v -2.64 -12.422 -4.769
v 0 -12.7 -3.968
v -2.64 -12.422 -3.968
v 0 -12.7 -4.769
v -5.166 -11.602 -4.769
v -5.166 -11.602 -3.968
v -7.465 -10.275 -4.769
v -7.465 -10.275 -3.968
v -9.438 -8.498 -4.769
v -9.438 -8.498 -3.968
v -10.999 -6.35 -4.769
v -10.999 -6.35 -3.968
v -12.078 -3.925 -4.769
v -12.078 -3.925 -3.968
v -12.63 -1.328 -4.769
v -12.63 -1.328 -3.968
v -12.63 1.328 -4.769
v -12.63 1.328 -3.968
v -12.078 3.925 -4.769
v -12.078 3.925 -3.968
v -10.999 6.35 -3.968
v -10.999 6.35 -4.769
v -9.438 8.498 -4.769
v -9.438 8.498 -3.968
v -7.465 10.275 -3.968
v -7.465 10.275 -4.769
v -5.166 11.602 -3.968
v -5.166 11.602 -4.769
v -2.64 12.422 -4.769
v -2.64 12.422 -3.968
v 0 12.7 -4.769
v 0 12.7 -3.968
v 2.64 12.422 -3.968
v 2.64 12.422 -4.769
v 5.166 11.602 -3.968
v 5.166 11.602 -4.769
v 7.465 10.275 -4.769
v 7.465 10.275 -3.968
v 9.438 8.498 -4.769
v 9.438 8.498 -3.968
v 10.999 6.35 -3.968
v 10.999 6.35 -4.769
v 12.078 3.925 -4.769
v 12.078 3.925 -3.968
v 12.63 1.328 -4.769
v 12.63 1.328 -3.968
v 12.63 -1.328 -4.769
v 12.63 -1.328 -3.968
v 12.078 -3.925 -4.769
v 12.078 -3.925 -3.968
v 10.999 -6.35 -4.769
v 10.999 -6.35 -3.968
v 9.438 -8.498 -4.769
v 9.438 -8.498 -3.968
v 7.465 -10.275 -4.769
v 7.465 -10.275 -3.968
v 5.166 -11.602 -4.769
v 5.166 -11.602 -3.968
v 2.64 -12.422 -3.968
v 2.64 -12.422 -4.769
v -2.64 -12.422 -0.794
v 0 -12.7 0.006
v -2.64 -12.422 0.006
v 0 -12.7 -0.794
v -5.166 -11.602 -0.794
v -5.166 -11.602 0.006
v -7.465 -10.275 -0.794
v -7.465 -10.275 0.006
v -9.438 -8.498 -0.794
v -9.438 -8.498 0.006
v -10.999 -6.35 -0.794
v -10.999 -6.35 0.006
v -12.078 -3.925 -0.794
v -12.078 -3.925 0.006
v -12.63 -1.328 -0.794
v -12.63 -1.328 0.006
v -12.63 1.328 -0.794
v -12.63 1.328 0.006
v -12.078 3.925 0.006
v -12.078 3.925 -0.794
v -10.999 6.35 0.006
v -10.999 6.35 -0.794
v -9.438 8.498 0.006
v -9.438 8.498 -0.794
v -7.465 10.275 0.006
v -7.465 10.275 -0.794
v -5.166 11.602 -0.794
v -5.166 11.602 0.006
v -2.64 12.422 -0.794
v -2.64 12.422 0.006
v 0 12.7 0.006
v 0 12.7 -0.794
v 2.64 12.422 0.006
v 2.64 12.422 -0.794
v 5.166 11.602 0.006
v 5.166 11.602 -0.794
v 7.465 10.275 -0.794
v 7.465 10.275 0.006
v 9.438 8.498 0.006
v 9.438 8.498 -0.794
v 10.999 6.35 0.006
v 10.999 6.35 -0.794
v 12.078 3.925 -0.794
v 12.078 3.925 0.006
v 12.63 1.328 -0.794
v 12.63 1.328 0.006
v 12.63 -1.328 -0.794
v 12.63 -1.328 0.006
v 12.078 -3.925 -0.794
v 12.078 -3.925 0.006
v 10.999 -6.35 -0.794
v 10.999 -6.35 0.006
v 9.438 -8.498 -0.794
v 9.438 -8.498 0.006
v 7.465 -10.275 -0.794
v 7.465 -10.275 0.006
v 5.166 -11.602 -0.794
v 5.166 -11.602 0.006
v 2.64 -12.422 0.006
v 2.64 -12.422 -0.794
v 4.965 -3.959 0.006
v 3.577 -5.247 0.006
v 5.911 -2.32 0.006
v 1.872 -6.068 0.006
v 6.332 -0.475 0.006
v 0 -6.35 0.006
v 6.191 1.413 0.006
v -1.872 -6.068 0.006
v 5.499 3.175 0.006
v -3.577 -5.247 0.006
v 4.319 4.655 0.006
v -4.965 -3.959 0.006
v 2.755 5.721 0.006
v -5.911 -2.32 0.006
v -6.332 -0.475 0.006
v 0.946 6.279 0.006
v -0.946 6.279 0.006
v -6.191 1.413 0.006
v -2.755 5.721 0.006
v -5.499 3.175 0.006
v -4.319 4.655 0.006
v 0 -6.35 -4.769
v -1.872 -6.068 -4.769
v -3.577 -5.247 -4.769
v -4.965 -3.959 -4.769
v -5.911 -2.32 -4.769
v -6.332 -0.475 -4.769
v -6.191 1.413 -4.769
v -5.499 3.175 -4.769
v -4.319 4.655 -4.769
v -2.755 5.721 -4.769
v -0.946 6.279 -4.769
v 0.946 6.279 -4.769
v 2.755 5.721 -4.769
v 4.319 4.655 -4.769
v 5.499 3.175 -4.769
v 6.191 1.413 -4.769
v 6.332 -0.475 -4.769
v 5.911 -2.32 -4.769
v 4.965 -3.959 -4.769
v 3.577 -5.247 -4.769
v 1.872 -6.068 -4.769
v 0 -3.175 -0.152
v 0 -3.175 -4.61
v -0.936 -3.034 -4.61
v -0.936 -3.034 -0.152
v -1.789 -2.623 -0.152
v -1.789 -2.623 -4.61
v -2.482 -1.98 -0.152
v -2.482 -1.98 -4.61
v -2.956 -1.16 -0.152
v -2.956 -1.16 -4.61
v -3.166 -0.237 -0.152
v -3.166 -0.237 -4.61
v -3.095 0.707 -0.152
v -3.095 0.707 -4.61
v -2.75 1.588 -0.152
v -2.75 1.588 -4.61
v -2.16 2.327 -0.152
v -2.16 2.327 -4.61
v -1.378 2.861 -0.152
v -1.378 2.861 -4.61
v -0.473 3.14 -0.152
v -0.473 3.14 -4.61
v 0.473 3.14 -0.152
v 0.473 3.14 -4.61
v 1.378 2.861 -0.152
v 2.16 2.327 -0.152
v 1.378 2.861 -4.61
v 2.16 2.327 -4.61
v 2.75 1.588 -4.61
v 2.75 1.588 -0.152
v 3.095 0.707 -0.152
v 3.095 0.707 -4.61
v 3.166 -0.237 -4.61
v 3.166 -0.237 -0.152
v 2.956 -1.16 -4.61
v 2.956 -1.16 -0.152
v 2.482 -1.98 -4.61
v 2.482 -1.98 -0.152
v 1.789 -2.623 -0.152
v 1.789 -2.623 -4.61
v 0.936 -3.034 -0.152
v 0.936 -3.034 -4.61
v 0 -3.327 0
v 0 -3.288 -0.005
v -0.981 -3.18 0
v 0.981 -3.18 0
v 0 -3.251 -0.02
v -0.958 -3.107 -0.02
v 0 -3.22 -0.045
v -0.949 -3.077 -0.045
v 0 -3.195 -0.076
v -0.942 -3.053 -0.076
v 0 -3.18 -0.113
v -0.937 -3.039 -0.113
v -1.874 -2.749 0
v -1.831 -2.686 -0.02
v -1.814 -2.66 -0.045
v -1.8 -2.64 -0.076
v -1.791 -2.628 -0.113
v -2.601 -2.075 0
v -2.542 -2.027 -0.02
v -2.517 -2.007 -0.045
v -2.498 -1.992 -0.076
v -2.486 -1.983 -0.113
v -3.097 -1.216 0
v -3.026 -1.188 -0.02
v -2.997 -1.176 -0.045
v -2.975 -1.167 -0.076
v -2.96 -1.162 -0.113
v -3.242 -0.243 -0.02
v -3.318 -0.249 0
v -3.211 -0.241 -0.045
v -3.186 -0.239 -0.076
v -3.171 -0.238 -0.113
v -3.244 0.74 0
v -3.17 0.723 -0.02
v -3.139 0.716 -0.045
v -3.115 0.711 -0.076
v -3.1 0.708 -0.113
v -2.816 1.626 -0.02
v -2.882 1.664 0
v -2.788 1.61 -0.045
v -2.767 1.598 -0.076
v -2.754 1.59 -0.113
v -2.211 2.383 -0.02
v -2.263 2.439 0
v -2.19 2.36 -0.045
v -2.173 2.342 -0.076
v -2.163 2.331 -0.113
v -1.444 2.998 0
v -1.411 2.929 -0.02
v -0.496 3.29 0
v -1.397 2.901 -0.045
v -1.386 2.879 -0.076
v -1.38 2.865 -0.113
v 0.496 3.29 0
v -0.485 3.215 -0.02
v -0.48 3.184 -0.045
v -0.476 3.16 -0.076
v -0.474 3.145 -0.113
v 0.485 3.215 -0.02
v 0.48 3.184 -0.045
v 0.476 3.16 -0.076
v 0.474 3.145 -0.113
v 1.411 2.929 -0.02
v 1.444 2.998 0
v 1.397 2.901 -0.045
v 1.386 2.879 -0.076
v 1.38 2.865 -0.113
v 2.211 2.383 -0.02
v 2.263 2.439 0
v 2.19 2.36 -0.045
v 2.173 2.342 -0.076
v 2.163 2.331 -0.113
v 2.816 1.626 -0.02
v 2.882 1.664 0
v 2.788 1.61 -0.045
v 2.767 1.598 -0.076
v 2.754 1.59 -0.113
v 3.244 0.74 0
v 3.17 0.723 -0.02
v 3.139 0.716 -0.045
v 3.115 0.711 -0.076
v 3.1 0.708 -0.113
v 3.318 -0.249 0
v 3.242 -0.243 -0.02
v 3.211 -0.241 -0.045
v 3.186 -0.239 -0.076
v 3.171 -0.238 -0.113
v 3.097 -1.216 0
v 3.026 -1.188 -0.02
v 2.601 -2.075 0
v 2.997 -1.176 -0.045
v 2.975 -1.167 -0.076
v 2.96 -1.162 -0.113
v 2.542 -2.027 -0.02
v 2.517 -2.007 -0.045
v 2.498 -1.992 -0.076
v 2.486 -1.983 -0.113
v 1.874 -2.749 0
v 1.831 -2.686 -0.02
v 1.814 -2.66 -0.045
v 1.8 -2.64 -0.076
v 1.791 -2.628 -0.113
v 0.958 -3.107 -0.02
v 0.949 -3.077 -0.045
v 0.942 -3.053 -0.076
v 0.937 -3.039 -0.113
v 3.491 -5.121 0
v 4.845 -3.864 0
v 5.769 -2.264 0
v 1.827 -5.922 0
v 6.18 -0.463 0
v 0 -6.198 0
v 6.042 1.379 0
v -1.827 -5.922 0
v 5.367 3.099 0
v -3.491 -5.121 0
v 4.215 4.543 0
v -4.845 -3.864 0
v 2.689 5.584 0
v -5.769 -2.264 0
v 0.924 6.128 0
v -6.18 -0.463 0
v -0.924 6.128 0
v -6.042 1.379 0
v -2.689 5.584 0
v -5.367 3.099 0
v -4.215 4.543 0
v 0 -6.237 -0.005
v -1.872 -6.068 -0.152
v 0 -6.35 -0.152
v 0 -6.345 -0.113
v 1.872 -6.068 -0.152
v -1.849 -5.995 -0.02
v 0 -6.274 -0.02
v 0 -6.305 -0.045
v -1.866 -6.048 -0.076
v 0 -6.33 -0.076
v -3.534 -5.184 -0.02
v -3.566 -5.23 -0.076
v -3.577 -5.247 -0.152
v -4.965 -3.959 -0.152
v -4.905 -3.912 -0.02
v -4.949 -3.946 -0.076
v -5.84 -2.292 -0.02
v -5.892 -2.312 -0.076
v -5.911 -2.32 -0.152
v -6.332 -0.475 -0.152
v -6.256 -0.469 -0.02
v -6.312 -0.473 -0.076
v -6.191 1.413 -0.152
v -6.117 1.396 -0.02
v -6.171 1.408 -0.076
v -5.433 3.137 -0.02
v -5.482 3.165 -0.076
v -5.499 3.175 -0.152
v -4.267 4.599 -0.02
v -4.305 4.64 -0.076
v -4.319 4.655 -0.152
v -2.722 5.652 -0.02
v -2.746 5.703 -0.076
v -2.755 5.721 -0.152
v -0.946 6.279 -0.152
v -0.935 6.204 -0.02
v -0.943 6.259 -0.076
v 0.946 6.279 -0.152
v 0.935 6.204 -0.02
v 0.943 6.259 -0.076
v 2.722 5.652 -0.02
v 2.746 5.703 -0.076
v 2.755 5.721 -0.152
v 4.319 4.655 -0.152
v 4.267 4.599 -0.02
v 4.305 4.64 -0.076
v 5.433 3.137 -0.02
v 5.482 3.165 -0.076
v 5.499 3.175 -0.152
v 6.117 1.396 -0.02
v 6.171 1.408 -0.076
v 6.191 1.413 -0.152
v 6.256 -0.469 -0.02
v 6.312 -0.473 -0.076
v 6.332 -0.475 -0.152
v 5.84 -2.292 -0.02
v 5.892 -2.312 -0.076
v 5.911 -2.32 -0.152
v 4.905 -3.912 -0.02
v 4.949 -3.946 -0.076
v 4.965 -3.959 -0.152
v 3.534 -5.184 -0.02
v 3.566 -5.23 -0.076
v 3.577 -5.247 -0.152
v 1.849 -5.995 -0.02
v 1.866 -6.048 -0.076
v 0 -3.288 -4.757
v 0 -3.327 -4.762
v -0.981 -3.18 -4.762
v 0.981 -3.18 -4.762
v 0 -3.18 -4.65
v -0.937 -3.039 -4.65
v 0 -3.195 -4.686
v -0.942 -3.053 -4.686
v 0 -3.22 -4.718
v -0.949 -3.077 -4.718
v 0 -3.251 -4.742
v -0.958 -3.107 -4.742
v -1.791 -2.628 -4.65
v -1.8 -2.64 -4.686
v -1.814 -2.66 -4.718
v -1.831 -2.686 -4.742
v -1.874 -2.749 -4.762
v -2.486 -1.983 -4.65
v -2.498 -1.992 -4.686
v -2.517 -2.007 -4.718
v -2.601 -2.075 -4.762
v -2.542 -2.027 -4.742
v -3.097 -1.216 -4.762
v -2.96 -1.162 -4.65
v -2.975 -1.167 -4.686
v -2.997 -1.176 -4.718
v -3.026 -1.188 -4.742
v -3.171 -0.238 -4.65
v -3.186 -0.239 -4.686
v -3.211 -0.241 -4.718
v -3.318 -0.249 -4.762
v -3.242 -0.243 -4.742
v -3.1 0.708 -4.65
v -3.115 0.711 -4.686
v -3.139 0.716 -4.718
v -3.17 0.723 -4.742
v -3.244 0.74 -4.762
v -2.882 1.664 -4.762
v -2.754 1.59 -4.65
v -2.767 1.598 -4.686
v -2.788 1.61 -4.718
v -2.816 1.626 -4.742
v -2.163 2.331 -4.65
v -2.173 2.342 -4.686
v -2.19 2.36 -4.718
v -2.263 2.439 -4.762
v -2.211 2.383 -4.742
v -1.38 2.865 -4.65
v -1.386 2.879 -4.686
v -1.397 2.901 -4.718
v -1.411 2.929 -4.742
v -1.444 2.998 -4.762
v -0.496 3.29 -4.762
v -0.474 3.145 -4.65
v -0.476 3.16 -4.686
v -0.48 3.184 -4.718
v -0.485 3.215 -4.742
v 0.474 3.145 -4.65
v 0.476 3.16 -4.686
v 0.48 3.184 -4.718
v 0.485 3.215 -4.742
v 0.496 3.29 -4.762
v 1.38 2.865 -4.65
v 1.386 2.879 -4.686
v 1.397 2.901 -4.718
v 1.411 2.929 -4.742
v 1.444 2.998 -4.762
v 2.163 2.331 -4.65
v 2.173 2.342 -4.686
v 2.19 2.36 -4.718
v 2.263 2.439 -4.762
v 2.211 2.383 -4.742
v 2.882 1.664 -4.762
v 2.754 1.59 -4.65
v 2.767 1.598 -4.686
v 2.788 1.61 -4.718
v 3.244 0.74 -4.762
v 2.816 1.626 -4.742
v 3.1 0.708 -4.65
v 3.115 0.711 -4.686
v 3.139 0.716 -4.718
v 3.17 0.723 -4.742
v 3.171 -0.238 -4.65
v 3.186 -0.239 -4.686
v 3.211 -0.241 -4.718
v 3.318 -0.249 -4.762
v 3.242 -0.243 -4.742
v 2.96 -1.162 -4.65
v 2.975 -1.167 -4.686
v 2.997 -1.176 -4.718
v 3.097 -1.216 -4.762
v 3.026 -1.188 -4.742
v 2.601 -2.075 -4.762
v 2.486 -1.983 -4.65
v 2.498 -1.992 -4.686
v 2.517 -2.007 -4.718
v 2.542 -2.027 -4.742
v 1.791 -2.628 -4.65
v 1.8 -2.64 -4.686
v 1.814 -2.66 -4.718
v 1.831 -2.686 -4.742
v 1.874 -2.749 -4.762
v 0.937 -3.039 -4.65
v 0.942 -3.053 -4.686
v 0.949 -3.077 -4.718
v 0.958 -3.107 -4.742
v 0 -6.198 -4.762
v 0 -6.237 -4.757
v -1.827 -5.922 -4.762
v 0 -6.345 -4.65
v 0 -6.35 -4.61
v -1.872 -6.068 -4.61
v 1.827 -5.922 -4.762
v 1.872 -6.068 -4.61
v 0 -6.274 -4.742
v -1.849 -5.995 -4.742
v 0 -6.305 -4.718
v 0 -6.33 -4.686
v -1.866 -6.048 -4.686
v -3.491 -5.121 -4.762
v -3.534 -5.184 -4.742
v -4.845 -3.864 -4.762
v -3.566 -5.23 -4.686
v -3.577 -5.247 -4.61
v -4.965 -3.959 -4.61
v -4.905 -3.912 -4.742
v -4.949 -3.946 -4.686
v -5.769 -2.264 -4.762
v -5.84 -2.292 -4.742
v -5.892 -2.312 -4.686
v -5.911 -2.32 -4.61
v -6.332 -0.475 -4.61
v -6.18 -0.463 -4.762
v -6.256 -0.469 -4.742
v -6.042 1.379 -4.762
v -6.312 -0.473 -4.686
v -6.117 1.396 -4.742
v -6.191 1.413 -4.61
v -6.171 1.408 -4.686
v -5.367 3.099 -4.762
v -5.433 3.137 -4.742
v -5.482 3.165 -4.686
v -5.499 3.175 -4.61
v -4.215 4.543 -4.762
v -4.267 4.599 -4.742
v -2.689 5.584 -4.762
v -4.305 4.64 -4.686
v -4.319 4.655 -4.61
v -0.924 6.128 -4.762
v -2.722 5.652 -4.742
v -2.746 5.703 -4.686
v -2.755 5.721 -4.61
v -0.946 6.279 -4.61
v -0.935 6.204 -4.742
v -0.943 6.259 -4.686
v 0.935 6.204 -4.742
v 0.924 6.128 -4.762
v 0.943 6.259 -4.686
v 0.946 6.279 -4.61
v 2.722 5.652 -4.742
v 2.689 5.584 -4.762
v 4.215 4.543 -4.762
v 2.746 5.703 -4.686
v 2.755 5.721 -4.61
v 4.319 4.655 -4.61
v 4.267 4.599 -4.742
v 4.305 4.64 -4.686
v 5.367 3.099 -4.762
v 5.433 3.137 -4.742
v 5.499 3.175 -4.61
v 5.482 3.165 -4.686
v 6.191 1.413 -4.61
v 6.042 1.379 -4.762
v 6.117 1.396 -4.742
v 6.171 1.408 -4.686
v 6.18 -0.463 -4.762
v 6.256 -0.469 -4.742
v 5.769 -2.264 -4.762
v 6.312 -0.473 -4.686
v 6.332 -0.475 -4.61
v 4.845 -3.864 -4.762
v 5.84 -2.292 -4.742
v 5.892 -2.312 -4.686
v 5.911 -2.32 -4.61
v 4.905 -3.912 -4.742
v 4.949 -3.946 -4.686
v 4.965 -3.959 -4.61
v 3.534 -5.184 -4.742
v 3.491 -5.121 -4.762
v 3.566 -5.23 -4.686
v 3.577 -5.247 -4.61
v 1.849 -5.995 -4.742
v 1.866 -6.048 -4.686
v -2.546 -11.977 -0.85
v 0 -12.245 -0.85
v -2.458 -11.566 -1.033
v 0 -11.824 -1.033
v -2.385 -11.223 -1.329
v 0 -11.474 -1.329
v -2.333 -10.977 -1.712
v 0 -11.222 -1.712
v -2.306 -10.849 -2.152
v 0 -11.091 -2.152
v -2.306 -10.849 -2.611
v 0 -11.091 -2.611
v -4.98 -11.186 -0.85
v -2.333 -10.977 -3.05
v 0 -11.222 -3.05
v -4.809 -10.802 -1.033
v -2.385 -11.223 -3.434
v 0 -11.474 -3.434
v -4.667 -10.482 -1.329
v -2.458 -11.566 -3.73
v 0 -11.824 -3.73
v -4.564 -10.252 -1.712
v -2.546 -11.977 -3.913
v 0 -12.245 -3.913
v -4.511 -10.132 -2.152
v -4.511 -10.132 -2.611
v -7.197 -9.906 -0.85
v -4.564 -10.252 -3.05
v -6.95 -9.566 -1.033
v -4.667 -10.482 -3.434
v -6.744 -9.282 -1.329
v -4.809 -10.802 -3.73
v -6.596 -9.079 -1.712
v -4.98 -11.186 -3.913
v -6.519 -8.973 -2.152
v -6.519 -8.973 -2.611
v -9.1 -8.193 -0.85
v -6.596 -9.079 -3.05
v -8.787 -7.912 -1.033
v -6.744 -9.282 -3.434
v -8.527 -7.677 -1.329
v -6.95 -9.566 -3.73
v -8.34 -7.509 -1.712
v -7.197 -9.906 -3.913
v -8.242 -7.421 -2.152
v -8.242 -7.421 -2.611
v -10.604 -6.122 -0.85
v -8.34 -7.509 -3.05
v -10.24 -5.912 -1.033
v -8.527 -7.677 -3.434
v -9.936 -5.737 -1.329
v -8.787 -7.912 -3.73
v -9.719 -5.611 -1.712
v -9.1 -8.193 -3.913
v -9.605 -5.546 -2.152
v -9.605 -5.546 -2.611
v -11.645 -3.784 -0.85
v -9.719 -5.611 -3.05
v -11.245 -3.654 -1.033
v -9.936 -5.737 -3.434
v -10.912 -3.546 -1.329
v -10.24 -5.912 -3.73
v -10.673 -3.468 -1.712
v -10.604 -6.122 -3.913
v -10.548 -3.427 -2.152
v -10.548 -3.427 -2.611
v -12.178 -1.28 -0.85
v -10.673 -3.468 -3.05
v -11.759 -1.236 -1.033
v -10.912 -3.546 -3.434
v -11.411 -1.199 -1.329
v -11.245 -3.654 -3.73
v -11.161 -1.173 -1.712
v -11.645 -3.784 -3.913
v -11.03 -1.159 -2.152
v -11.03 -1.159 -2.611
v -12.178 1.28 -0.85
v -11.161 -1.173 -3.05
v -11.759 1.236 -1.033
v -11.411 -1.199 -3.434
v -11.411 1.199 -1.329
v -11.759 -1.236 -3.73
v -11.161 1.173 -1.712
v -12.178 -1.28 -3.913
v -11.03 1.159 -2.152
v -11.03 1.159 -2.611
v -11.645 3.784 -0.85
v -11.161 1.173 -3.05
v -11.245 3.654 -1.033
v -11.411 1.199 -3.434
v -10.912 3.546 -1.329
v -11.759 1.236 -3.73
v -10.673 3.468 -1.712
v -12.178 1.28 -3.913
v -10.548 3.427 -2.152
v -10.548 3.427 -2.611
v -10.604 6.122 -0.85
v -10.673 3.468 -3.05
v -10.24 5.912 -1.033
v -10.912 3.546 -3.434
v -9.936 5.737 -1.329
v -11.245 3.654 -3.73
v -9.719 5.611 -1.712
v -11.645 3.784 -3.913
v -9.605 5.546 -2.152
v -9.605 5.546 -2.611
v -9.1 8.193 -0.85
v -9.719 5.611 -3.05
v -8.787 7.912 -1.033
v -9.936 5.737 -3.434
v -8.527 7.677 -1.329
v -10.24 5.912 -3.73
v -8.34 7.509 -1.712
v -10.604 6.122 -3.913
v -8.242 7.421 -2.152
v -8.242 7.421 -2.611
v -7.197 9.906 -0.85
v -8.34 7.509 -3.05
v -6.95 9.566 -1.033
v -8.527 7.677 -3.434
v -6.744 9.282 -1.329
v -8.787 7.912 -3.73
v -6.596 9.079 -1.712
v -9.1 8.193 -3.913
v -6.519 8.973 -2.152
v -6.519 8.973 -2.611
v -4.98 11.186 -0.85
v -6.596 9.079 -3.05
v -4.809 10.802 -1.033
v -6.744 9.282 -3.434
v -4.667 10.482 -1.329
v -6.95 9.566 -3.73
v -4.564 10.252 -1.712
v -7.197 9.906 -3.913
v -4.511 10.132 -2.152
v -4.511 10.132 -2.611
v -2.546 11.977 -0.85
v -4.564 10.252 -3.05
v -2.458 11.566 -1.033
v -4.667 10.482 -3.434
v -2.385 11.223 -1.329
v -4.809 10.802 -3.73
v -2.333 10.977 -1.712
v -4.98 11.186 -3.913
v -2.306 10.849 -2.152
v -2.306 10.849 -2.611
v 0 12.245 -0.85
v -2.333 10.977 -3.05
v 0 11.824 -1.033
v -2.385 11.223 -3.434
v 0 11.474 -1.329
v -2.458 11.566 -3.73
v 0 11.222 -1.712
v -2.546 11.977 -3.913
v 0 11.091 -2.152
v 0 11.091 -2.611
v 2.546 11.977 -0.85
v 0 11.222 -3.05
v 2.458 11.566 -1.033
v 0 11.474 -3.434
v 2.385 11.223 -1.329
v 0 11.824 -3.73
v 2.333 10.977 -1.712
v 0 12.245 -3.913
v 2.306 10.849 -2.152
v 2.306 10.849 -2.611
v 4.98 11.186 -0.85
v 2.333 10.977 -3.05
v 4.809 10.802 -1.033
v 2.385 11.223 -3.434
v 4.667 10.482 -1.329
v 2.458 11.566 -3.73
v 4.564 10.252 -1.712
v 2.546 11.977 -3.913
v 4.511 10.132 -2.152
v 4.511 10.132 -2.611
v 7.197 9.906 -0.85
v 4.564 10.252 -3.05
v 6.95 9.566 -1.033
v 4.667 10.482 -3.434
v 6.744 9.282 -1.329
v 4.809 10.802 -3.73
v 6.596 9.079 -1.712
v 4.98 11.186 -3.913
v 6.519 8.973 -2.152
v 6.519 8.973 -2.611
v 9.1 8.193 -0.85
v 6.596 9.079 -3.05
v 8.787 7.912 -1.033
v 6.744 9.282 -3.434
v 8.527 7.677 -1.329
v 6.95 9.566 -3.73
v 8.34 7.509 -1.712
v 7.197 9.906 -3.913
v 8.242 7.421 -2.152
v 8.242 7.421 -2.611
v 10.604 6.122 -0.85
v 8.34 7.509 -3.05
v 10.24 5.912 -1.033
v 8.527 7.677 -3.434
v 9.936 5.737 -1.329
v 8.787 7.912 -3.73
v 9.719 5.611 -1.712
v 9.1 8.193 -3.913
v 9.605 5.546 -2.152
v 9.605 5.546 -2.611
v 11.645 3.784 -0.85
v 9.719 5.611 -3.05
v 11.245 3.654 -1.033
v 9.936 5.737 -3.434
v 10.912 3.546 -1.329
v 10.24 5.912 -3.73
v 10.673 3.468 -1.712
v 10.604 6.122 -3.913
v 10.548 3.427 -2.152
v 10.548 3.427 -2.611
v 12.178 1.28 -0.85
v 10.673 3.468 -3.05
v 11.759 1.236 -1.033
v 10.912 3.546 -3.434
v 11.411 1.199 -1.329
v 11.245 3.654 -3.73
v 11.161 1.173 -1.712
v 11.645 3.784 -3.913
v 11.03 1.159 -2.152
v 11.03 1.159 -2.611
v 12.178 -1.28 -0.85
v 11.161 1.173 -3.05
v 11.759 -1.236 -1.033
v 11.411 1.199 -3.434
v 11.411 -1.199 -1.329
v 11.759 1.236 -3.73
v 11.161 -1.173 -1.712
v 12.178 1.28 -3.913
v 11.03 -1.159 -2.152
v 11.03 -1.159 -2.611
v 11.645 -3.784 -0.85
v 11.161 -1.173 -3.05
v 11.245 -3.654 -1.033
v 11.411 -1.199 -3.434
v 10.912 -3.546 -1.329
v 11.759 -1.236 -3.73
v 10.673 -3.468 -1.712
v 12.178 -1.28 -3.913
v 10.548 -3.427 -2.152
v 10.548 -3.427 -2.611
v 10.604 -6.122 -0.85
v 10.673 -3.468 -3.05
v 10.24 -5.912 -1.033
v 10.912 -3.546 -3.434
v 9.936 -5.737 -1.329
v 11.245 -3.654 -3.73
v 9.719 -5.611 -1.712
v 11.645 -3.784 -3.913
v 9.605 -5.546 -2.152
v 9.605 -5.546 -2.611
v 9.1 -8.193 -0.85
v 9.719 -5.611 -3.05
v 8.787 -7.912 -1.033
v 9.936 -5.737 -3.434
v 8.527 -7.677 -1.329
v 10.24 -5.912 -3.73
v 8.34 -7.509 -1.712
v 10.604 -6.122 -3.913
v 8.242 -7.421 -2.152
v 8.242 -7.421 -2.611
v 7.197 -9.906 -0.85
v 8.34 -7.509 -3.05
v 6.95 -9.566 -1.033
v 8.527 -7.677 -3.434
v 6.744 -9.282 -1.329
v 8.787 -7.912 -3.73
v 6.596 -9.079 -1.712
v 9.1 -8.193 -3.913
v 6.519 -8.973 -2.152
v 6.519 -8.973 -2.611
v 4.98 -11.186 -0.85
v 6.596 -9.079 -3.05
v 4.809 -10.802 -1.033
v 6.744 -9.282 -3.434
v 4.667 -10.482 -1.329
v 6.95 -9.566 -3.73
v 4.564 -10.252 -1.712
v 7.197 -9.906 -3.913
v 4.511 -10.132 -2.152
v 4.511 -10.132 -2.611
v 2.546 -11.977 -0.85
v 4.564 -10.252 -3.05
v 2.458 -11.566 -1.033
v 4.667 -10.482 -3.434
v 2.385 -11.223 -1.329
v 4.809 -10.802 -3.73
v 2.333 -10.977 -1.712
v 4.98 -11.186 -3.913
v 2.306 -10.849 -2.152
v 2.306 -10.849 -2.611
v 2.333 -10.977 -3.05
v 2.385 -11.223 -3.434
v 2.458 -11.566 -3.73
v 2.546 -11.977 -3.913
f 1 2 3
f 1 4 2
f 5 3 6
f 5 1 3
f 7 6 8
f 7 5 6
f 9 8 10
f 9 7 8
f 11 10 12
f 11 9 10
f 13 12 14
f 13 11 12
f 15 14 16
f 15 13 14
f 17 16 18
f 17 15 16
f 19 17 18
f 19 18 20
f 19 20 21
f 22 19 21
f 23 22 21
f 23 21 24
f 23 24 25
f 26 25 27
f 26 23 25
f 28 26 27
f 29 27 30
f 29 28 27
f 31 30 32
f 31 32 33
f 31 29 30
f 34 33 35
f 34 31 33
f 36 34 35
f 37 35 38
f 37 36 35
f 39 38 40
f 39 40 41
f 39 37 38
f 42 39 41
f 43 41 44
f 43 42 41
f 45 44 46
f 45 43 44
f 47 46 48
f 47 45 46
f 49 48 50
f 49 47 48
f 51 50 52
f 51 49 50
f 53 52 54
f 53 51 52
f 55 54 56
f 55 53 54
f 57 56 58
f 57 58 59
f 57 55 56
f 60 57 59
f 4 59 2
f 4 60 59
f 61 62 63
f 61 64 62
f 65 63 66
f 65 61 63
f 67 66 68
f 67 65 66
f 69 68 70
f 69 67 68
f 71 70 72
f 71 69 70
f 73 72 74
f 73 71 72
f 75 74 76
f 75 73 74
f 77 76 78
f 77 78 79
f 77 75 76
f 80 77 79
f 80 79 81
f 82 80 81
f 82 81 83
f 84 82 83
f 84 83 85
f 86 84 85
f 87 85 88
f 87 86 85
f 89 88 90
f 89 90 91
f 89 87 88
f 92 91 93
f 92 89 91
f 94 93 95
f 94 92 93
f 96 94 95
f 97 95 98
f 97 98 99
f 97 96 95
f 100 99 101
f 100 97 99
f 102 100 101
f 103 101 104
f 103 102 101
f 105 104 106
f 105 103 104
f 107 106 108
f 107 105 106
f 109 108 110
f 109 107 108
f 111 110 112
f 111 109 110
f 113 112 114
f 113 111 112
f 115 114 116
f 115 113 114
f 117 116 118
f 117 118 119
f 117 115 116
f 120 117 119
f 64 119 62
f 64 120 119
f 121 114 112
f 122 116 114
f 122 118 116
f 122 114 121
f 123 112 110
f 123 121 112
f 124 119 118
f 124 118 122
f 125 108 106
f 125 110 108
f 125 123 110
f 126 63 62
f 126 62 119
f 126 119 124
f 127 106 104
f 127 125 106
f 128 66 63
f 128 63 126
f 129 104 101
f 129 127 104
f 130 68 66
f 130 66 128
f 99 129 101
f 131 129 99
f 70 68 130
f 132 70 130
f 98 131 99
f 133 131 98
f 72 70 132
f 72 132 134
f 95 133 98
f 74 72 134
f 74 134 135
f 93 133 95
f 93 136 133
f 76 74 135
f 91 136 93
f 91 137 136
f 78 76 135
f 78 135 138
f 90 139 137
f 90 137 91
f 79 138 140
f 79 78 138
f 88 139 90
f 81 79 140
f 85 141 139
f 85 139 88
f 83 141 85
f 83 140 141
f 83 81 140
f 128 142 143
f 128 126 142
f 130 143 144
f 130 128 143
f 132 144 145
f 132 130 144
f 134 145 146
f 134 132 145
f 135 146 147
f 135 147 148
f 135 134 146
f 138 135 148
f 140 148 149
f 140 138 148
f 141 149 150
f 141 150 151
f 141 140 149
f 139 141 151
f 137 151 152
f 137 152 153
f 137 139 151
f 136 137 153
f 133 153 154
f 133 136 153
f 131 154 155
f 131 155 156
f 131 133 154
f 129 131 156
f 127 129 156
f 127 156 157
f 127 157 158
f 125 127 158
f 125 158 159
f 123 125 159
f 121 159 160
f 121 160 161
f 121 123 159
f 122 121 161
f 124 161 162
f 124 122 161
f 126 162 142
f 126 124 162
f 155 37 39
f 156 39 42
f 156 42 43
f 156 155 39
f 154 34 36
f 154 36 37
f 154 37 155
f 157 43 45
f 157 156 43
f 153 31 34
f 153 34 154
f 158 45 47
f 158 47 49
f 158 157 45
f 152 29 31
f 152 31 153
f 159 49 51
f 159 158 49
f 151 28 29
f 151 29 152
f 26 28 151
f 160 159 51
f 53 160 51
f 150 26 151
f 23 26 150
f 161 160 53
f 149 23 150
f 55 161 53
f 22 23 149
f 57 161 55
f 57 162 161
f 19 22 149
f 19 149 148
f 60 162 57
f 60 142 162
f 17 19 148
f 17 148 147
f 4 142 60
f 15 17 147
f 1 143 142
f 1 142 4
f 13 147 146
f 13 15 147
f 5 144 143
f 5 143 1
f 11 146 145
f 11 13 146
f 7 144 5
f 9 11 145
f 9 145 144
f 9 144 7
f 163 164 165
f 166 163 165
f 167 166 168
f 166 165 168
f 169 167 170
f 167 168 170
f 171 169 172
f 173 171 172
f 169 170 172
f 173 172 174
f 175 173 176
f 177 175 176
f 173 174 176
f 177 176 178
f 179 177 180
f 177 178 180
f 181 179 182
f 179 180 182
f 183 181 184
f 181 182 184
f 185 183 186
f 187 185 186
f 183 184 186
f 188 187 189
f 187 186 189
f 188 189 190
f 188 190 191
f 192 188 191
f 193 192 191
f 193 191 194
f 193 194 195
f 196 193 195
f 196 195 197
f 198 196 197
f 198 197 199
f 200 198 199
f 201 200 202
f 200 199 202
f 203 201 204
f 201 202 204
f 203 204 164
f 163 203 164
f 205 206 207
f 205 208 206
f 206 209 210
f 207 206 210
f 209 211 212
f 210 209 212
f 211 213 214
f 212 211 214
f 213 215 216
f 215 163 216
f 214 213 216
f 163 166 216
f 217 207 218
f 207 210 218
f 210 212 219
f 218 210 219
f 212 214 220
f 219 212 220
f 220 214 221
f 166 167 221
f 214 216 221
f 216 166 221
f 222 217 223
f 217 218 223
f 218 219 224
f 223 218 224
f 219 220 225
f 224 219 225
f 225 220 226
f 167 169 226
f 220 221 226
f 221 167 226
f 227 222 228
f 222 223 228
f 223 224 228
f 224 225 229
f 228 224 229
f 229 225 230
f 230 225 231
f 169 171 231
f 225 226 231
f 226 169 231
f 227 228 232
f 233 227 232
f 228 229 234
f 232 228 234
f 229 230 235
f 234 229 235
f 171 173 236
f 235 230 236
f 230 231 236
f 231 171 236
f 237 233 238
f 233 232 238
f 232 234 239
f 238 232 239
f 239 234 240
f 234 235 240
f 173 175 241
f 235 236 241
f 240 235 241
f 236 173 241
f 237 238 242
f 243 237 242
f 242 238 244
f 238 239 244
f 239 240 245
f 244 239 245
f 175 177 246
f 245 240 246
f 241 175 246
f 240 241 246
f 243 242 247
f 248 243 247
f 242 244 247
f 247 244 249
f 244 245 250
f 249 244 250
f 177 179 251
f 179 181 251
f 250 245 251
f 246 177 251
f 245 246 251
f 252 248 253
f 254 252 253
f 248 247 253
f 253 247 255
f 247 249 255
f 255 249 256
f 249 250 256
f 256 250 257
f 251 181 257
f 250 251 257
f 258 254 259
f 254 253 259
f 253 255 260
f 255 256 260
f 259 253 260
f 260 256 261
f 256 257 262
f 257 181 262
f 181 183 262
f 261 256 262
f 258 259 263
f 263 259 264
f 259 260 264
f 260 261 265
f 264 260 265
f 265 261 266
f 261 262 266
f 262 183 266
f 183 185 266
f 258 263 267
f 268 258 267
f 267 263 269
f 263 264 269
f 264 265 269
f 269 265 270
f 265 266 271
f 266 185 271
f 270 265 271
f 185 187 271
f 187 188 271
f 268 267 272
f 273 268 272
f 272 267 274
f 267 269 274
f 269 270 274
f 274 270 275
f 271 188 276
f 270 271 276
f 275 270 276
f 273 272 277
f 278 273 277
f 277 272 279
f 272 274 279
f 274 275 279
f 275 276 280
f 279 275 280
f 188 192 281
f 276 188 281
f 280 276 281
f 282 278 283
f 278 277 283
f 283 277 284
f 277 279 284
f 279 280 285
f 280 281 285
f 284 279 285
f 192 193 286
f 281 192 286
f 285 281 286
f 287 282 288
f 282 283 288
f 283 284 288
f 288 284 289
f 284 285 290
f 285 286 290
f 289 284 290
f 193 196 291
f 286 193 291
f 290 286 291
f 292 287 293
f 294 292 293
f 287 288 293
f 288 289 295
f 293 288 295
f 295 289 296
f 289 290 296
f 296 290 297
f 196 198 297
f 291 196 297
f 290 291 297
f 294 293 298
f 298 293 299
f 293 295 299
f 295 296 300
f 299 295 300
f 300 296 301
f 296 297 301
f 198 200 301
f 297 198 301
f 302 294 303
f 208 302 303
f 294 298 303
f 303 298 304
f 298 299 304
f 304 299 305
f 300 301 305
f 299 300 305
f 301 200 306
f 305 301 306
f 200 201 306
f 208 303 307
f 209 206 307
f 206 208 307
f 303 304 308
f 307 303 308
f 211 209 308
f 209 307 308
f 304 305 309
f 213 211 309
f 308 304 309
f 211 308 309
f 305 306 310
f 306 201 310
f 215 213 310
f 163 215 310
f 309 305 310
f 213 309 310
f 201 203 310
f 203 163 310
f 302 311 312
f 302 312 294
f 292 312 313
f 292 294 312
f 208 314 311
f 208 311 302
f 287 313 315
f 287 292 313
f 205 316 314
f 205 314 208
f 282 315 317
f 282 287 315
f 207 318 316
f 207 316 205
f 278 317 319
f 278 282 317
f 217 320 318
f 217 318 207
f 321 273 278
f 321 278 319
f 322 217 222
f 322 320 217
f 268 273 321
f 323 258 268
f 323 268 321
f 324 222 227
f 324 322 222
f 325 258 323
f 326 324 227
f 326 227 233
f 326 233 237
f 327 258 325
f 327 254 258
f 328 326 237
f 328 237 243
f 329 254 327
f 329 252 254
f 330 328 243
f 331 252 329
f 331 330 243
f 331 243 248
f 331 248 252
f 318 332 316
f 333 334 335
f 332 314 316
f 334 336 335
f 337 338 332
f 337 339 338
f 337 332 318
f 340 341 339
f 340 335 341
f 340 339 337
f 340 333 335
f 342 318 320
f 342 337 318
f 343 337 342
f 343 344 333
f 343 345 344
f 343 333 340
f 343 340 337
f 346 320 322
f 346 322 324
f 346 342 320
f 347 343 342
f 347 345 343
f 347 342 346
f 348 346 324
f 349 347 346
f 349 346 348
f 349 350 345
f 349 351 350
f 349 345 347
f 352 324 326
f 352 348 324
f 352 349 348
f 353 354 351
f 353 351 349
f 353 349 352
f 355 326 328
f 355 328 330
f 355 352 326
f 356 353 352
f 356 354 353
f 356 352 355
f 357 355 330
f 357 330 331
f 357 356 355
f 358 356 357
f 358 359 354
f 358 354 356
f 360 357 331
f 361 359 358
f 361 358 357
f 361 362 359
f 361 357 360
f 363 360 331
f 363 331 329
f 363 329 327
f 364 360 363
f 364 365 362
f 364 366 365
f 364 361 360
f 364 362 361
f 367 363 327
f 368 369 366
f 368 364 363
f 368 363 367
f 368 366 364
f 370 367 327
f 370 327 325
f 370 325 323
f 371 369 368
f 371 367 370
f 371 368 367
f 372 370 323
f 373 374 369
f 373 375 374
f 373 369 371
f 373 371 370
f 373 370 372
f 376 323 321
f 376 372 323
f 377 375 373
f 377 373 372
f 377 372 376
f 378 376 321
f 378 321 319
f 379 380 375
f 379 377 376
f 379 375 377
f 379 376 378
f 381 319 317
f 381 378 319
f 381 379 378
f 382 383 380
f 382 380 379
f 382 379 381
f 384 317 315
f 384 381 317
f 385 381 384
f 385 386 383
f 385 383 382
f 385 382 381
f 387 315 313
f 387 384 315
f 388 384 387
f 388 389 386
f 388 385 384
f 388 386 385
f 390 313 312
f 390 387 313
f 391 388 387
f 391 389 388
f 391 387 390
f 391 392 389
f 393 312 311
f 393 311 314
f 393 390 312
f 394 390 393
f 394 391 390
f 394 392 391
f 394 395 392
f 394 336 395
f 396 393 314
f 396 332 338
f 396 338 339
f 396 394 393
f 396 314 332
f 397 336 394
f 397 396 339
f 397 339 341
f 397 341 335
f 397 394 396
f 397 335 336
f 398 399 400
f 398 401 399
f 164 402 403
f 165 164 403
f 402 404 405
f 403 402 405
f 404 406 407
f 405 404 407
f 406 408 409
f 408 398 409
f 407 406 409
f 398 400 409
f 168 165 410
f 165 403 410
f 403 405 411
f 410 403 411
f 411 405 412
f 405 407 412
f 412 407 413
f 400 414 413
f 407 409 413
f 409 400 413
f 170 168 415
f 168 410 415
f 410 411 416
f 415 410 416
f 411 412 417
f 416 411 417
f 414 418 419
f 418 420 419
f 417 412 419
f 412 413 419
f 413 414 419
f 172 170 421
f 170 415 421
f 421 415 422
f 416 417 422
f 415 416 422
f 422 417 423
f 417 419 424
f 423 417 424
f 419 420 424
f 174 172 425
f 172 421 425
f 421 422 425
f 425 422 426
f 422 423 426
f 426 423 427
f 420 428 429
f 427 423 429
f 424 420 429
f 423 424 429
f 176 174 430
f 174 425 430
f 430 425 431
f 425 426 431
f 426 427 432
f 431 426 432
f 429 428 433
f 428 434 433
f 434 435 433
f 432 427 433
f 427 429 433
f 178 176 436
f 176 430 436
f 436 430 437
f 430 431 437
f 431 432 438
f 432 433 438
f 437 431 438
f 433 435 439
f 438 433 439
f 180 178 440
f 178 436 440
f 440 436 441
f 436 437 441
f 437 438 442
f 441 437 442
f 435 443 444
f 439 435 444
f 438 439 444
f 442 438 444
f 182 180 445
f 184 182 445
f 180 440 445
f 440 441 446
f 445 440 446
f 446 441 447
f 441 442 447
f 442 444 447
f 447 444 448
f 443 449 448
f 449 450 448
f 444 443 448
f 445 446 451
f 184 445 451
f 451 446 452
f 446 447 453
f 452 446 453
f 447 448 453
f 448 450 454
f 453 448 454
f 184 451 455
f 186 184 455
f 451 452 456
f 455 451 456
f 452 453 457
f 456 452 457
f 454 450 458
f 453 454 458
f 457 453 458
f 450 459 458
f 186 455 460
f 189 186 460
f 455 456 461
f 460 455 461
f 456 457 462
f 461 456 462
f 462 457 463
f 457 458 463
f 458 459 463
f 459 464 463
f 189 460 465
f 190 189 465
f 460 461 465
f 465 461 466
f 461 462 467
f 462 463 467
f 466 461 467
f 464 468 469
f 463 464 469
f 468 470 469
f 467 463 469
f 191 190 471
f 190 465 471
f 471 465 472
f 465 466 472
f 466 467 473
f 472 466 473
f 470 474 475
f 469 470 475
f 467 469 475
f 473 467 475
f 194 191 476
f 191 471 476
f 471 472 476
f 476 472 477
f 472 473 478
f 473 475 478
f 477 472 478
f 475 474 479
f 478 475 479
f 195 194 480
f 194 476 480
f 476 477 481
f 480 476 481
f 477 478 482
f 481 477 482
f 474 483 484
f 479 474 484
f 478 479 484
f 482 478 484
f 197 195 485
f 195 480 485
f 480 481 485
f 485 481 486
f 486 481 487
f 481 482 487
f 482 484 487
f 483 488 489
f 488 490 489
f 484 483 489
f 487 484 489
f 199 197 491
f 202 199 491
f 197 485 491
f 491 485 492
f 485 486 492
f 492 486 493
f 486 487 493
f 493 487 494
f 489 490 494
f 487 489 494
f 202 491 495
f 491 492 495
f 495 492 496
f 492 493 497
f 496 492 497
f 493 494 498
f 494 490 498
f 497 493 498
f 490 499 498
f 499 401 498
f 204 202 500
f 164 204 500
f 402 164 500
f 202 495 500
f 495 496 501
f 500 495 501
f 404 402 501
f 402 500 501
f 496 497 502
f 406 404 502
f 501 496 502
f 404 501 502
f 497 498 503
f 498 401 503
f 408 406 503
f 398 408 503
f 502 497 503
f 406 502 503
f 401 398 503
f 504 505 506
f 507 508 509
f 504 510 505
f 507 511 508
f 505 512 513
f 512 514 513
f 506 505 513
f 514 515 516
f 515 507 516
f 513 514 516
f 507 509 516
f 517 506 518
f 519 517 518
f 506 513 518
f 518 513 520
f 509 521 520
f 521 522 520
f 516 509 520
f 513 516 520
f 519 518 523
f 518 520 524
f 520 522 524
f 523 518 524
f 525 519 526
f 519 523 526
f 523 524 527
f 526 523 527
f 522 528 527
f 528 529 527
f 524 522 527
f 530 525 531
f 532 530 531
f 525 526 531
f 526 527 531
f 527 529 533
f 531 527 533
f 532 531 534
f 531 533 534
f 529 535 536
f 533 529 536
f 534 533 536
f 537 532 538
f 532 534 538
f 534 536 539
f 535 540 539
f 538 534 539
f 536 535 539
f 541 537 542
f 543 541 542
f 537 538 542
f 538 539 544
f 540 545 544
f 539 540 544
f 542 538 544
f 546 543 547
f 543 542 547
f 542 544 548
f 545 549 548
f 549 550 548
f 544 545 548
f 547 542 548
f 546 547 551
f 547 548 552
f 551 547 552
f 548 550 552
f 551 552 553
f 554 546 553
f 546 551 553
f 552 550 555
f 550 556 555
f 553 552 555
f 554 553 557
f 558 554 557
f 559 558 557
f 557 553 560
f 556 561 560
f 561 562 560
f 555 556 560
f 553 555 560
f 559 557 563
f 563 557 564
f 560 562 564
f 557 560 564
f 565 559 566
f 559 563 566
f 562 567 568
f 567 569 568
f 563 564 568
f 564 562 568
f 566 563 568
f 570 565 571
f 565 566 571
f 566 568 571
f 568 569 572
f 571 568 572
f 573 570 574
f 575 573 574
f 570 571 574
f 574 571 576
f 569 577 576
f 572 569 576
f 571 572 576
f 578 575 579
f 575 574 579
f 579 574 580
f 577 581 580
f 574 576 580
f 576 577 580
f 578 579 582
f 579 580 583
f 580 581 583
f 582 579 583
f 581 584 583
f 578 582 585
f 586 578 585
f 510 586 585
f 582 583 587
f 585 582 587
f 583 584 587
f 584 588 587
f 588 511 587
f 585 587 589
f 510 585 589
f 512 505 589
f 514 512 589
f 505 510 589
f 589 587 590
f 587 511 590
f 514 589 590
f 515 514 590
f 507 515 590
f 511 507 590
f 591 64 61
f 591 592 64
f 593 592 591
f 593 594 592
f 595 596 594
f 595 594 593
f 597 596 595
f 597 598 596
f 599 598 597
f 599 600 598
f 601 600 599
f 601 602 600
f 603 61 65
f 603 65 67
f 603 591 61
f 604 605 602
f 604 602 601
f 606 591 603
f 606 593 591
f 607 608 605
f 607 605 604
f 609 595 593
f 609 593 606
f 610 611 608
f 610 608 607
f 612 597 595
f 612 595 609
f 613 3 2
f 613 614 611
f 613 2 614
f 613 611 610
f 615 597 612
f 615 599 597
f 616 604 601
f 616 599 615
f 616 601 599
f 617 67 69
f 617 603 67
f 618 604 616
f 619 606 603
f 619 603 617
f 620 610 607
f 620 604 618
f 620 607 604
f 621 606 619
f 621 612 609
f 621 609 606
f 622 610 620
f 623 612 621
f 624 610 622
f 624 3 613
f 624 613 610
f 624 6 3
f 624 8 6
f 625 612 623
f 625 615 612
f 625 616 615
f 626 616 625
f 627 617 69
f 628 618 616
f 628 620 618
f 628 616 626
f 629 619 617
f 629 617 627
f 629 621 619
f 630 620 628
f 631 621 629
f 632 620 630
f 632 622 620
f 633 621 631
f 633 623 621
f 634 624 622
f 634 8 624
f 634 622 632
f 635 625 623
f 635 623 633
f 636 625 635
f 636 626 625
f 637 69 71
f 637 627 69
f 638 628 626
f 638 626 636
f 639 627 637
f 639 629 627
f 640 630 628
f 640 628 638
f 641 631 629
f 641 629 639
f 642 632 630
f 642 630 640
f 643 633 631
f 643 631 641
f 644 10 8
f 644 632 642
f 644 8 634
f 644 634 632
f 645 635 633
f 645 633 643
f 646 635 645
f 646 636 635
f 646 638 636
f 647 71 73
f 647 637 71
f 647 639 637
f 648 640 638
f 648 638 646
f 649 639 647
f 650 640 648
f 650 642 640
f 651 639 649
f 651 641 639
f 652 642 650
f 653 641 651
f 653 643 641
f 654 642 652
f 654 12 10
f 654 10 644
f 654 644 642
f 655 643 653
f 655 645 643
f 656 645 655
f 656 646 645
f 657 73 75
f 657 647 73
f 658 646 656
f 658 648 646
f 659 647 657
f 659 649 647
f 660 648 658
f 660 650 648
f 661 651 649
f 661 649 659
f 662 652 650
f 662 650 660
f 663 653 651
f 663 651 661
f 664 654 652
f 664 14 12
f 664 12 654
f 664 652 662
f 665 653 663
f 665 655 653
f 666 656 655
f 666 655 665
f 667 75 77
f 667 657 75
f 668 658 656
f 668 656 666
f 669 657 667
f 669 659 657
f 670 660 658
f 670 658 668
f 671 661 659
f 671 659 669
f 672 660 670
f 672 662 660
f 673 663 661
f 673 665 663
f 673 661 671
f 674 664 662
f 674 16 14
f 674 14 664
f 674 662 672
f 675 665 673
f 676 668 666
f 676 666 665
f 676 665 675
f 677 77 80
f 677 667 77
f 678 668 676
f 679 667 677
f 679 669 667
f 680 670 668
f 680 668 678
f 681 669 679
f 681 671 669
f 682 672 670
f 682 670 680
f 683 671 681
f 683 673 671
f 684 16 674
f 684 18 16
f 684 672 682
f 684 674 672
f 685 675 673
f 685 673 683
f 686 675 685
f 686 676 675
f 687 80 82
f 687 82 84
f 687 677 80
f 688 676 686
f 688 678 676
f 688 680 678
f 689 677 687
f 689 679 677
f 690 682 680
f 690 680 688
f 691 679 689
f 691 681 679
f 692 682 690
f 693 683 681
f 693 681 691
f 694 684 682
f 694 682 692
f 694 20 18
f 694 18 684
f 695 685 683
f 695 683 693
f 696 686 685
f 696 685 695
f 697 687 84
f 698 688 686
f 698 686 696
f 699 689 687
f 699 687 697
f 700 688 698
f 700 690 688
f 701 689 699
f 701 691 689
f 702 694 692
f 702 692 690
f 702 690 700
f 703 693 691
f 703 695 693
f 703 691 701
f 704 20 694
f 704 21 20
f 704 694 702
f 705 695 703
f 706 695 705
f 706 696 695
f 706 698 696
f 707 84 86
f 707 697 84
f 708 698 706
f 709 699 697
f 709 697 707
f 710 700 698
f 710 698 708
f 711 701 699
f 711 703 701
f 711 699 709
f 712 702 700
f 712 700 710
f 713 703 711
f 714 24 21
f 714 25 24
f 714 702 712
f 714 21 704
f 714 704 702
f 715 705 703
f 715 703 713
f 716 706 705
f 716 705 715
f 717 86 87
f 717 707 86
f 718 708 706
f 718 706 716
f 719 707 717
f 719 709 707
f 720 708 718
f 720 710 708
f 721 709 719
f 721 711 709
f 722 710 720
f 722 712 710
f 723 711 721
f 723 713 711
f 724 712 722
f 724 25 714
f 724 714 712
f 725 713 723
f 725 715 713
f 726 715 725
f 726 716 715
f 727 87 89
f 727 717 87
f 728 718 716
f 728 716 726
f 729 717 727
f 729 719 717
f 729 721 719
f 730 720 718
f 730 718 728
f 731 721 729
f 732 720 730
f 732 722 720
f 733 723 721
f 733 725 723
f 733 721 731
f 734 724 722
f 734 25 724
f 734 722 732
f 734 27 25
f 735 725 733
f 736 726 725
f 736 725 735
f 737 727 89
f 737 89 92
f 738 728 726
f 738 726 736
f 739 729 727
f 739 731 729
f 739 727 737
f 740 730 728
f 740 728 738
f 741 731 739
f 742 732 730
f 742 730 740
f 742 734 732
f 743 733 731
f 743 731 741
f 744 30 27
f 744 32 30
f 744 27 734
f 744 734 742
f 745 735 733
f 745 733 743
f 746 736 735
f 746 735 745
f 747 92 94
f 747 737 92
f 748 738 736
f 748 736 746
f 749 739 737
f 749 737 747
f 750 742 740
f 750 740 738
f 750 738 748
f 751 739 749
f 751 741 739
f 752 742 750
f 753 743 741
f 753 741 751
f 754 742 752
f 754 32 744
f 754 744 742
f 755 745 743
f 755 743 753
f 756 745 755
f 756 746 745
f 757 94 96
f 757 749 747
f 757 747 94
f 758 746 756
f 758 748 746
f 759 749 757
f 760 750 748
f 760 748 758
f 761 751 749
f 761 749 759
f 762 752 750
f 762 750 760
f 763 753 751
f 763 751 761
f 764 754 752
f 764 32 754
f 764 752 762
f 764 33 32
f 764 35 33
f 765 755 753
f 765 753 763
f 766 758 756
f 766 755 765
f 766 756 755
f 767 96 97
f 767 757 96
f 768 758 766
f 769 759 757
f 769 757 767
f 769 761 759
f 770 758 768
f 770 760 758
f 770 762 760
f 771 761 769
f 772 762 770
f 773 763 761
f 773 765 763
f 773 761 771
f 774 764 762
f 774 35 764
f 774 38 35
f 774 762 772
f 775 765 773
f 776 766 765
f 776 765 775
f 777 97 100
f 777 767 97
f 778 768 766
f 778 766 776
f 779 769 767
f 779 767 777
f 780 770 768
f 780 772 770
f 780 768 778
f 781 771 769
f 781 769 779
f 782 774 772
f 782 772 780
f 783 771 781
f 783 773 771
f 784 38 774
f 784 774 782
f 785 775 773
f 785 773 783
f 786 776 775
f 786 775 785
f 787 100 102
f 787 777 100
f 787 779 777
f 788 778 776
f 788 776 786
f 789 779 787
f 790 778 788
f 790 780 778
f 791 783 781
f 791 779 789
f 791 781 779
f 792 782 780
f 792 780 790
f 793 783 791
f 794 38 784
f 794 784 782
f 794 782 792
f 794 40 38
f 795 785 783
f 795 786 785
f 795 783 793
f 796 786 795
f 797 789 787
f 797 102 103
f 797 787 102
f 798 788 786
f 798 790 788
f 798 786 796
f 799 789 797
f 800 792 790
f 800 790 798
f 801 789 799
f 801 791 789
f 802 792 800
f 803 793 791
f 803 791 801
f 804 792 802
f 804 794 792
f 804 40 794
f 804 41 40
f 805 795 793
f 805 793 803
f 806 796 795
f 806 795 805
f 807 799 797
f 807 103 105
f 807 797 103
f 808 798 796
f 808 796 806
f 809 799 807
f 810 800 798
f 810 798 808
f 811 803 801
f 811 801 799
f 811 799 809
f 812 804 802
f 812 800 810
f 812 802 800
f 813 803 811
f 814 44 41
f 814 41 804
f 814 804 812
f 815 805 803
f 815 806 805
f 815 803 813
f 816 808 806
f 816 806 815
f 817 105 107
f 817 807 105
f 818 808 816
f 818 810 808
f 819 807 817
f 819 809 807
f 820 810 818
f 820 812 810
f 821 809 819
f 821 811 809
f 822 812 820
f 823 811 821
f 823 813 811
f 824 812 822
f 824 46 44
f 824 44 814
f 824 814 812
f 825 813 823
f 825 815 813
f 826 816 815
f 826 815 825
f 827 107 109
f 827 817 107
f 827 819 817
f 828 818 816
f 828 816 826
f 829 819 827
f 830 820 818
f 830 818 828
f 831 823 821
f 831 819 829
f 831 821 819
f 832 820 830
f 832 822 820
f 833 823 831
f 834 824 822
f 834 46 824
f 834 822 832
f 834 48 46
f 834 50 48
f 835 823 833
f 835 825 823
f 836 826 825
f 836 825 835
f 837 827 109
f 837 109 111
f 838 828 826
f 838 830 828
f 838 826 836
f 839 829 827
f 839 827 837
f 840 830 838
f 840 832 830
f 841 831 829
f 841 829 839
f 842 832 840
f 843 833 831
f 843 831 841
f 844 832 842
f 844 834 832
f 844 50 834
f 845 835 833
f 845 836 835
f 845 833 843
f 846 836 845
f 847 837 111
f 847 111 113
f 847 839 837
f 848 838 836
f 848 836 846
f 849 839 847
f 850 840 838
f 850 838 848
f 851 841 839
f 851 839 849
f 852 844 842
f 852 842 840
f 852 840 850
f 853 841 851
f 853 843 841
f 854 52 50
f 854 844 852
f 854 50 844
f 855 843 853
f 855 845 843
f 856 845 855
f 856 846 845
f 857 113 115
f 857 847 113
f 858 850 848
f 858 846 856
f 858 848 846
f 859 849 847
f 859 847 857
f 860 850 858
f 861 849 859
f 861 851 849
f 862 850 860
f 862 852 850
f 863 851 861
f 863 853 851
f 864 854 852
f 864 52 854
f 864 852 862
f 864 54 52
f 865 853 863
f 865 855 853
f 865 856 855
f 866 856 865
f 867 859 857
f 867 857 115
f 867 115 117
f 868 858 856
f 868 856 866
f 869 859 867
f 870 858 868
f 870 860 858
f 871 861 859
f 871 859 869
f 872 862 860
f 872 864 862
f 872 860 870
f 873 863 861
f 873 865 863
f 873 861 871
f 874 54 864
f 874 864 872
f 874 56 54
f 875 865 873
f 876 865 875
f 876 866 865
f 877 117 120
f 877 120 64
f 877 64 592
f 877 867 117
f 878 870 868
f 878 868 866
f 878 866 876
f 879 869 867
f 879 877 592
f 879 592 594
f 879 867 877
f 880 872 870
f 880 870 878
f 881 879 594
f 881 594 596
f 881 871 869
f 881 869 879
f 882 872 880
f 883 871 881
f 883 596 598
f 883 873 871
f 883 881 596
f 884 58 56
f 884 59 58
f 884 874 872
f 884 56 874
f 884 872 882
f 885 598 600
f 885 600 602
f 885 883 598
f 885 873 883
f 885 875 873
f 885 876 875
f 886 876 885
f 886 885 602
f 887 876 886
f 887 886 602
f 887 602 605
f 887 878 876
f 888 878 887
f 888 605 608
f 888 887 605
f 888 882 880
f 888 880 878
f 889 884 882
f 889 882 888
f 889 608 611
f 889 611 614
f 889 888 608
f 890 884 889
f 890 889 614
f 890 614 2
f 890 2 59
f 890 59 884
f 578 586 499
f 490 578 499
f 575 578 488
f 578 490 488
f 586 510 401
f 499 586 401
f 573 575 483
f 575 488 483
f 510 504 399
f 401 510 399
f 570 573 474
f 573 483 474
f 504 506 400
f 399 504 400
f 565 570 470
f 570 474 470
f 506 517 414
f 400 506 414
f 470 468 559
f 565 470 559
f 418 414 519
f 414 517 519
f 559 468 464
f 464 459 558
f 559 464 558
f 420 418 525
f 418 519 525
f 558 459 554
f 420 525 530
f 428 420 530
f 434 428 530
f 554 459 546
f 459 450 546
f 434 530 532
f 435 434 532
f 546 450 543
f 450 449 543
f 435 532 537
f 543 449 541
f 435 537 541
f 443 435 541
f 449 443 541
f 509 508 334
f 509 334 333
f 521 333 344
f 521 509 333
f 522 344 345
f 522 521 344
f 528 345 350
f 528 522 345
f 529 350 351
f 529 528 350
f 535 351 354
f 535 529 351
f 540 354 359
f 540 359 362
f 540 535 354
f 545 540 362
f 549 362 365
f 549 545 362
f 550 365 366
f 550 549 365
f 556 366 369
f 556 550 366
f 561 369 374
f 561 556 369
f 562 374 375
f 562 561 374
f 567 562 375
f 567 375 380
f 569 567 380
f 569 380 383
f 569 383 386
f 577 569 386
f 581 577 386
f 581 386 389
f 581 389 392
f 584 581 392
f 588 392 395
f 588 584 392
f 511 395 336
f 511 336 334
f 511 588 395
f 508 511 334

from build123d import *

# Parameters (mm, degrees)
SKETCH2_W = 4.7625
SKETCH2_H = 3.175
FILLET1_R = 0.1524


with BuildPart() as part:
    # Sketch1 → Revolve1 (revolve)
    with BuildSketch(Plane(origin=(0, 0, 0), x_dir=(0, 0, -1), z_dir=(1, 0, 0)), mode=Mode.PRIVATE) as revolve1_sk:
        with BuildLine():
            Line((3.968292734, 12.7), (4.76885, 12.7))
            Line((4.76885, 12.7), (4.76885, 6.35))
            Line((4.76885, 6.35), (-0.00635, 6.35))
            Line((-0.00635, 6.35), (-0.00635, 12.7))
            Line((-0.00635, 12.7), (0.794207266, 12.7))
            ThreePointArc((0.794207266, 12.7), (2.38125, 11.0744), (3.968292734, 12.7))
        make_face()
    revolve(revolve1_sk.sketch.rotate(Axis((0, 0, 0), (0, 0, -1)), 180), axis=Axis((0, 0, 0), (0, 0, -1)))


with BuildPart() as body_2:
    # Sketch2 → Revolve2 (revolve)
    with BuildSketch(Plane(origin=(0, 0, 0), x_dir=(0, 0, -1), z_dir=(1, 0, 0)), mode=Mode.PRIVATE) as revolve2_sk:
        with Locations((2.38125, 4.7625)):
            Rectangle(SKETCH2_W, SKETCH2_H)
    revolve(revolve2_sk.sketch.rotate(Axis((0, 0, 0), (0, 0, -1)), 180), axis=Axis((0, 0, 0), (0, 0, -1)))

    # Fillet1
    fillet1_edges = [body_2.edges().sort_by_distance(p)[0] for p in [
        (0, 6.35, 0),
        (0, 6.35, -4.7625),
        (0, 3.175, -4.7625),
        (0, 3.175, 0),
    ]]
    fillet(fillet1_edges, radius=FILLET1_R)


solid = Compound([part.part, body_2.part])
